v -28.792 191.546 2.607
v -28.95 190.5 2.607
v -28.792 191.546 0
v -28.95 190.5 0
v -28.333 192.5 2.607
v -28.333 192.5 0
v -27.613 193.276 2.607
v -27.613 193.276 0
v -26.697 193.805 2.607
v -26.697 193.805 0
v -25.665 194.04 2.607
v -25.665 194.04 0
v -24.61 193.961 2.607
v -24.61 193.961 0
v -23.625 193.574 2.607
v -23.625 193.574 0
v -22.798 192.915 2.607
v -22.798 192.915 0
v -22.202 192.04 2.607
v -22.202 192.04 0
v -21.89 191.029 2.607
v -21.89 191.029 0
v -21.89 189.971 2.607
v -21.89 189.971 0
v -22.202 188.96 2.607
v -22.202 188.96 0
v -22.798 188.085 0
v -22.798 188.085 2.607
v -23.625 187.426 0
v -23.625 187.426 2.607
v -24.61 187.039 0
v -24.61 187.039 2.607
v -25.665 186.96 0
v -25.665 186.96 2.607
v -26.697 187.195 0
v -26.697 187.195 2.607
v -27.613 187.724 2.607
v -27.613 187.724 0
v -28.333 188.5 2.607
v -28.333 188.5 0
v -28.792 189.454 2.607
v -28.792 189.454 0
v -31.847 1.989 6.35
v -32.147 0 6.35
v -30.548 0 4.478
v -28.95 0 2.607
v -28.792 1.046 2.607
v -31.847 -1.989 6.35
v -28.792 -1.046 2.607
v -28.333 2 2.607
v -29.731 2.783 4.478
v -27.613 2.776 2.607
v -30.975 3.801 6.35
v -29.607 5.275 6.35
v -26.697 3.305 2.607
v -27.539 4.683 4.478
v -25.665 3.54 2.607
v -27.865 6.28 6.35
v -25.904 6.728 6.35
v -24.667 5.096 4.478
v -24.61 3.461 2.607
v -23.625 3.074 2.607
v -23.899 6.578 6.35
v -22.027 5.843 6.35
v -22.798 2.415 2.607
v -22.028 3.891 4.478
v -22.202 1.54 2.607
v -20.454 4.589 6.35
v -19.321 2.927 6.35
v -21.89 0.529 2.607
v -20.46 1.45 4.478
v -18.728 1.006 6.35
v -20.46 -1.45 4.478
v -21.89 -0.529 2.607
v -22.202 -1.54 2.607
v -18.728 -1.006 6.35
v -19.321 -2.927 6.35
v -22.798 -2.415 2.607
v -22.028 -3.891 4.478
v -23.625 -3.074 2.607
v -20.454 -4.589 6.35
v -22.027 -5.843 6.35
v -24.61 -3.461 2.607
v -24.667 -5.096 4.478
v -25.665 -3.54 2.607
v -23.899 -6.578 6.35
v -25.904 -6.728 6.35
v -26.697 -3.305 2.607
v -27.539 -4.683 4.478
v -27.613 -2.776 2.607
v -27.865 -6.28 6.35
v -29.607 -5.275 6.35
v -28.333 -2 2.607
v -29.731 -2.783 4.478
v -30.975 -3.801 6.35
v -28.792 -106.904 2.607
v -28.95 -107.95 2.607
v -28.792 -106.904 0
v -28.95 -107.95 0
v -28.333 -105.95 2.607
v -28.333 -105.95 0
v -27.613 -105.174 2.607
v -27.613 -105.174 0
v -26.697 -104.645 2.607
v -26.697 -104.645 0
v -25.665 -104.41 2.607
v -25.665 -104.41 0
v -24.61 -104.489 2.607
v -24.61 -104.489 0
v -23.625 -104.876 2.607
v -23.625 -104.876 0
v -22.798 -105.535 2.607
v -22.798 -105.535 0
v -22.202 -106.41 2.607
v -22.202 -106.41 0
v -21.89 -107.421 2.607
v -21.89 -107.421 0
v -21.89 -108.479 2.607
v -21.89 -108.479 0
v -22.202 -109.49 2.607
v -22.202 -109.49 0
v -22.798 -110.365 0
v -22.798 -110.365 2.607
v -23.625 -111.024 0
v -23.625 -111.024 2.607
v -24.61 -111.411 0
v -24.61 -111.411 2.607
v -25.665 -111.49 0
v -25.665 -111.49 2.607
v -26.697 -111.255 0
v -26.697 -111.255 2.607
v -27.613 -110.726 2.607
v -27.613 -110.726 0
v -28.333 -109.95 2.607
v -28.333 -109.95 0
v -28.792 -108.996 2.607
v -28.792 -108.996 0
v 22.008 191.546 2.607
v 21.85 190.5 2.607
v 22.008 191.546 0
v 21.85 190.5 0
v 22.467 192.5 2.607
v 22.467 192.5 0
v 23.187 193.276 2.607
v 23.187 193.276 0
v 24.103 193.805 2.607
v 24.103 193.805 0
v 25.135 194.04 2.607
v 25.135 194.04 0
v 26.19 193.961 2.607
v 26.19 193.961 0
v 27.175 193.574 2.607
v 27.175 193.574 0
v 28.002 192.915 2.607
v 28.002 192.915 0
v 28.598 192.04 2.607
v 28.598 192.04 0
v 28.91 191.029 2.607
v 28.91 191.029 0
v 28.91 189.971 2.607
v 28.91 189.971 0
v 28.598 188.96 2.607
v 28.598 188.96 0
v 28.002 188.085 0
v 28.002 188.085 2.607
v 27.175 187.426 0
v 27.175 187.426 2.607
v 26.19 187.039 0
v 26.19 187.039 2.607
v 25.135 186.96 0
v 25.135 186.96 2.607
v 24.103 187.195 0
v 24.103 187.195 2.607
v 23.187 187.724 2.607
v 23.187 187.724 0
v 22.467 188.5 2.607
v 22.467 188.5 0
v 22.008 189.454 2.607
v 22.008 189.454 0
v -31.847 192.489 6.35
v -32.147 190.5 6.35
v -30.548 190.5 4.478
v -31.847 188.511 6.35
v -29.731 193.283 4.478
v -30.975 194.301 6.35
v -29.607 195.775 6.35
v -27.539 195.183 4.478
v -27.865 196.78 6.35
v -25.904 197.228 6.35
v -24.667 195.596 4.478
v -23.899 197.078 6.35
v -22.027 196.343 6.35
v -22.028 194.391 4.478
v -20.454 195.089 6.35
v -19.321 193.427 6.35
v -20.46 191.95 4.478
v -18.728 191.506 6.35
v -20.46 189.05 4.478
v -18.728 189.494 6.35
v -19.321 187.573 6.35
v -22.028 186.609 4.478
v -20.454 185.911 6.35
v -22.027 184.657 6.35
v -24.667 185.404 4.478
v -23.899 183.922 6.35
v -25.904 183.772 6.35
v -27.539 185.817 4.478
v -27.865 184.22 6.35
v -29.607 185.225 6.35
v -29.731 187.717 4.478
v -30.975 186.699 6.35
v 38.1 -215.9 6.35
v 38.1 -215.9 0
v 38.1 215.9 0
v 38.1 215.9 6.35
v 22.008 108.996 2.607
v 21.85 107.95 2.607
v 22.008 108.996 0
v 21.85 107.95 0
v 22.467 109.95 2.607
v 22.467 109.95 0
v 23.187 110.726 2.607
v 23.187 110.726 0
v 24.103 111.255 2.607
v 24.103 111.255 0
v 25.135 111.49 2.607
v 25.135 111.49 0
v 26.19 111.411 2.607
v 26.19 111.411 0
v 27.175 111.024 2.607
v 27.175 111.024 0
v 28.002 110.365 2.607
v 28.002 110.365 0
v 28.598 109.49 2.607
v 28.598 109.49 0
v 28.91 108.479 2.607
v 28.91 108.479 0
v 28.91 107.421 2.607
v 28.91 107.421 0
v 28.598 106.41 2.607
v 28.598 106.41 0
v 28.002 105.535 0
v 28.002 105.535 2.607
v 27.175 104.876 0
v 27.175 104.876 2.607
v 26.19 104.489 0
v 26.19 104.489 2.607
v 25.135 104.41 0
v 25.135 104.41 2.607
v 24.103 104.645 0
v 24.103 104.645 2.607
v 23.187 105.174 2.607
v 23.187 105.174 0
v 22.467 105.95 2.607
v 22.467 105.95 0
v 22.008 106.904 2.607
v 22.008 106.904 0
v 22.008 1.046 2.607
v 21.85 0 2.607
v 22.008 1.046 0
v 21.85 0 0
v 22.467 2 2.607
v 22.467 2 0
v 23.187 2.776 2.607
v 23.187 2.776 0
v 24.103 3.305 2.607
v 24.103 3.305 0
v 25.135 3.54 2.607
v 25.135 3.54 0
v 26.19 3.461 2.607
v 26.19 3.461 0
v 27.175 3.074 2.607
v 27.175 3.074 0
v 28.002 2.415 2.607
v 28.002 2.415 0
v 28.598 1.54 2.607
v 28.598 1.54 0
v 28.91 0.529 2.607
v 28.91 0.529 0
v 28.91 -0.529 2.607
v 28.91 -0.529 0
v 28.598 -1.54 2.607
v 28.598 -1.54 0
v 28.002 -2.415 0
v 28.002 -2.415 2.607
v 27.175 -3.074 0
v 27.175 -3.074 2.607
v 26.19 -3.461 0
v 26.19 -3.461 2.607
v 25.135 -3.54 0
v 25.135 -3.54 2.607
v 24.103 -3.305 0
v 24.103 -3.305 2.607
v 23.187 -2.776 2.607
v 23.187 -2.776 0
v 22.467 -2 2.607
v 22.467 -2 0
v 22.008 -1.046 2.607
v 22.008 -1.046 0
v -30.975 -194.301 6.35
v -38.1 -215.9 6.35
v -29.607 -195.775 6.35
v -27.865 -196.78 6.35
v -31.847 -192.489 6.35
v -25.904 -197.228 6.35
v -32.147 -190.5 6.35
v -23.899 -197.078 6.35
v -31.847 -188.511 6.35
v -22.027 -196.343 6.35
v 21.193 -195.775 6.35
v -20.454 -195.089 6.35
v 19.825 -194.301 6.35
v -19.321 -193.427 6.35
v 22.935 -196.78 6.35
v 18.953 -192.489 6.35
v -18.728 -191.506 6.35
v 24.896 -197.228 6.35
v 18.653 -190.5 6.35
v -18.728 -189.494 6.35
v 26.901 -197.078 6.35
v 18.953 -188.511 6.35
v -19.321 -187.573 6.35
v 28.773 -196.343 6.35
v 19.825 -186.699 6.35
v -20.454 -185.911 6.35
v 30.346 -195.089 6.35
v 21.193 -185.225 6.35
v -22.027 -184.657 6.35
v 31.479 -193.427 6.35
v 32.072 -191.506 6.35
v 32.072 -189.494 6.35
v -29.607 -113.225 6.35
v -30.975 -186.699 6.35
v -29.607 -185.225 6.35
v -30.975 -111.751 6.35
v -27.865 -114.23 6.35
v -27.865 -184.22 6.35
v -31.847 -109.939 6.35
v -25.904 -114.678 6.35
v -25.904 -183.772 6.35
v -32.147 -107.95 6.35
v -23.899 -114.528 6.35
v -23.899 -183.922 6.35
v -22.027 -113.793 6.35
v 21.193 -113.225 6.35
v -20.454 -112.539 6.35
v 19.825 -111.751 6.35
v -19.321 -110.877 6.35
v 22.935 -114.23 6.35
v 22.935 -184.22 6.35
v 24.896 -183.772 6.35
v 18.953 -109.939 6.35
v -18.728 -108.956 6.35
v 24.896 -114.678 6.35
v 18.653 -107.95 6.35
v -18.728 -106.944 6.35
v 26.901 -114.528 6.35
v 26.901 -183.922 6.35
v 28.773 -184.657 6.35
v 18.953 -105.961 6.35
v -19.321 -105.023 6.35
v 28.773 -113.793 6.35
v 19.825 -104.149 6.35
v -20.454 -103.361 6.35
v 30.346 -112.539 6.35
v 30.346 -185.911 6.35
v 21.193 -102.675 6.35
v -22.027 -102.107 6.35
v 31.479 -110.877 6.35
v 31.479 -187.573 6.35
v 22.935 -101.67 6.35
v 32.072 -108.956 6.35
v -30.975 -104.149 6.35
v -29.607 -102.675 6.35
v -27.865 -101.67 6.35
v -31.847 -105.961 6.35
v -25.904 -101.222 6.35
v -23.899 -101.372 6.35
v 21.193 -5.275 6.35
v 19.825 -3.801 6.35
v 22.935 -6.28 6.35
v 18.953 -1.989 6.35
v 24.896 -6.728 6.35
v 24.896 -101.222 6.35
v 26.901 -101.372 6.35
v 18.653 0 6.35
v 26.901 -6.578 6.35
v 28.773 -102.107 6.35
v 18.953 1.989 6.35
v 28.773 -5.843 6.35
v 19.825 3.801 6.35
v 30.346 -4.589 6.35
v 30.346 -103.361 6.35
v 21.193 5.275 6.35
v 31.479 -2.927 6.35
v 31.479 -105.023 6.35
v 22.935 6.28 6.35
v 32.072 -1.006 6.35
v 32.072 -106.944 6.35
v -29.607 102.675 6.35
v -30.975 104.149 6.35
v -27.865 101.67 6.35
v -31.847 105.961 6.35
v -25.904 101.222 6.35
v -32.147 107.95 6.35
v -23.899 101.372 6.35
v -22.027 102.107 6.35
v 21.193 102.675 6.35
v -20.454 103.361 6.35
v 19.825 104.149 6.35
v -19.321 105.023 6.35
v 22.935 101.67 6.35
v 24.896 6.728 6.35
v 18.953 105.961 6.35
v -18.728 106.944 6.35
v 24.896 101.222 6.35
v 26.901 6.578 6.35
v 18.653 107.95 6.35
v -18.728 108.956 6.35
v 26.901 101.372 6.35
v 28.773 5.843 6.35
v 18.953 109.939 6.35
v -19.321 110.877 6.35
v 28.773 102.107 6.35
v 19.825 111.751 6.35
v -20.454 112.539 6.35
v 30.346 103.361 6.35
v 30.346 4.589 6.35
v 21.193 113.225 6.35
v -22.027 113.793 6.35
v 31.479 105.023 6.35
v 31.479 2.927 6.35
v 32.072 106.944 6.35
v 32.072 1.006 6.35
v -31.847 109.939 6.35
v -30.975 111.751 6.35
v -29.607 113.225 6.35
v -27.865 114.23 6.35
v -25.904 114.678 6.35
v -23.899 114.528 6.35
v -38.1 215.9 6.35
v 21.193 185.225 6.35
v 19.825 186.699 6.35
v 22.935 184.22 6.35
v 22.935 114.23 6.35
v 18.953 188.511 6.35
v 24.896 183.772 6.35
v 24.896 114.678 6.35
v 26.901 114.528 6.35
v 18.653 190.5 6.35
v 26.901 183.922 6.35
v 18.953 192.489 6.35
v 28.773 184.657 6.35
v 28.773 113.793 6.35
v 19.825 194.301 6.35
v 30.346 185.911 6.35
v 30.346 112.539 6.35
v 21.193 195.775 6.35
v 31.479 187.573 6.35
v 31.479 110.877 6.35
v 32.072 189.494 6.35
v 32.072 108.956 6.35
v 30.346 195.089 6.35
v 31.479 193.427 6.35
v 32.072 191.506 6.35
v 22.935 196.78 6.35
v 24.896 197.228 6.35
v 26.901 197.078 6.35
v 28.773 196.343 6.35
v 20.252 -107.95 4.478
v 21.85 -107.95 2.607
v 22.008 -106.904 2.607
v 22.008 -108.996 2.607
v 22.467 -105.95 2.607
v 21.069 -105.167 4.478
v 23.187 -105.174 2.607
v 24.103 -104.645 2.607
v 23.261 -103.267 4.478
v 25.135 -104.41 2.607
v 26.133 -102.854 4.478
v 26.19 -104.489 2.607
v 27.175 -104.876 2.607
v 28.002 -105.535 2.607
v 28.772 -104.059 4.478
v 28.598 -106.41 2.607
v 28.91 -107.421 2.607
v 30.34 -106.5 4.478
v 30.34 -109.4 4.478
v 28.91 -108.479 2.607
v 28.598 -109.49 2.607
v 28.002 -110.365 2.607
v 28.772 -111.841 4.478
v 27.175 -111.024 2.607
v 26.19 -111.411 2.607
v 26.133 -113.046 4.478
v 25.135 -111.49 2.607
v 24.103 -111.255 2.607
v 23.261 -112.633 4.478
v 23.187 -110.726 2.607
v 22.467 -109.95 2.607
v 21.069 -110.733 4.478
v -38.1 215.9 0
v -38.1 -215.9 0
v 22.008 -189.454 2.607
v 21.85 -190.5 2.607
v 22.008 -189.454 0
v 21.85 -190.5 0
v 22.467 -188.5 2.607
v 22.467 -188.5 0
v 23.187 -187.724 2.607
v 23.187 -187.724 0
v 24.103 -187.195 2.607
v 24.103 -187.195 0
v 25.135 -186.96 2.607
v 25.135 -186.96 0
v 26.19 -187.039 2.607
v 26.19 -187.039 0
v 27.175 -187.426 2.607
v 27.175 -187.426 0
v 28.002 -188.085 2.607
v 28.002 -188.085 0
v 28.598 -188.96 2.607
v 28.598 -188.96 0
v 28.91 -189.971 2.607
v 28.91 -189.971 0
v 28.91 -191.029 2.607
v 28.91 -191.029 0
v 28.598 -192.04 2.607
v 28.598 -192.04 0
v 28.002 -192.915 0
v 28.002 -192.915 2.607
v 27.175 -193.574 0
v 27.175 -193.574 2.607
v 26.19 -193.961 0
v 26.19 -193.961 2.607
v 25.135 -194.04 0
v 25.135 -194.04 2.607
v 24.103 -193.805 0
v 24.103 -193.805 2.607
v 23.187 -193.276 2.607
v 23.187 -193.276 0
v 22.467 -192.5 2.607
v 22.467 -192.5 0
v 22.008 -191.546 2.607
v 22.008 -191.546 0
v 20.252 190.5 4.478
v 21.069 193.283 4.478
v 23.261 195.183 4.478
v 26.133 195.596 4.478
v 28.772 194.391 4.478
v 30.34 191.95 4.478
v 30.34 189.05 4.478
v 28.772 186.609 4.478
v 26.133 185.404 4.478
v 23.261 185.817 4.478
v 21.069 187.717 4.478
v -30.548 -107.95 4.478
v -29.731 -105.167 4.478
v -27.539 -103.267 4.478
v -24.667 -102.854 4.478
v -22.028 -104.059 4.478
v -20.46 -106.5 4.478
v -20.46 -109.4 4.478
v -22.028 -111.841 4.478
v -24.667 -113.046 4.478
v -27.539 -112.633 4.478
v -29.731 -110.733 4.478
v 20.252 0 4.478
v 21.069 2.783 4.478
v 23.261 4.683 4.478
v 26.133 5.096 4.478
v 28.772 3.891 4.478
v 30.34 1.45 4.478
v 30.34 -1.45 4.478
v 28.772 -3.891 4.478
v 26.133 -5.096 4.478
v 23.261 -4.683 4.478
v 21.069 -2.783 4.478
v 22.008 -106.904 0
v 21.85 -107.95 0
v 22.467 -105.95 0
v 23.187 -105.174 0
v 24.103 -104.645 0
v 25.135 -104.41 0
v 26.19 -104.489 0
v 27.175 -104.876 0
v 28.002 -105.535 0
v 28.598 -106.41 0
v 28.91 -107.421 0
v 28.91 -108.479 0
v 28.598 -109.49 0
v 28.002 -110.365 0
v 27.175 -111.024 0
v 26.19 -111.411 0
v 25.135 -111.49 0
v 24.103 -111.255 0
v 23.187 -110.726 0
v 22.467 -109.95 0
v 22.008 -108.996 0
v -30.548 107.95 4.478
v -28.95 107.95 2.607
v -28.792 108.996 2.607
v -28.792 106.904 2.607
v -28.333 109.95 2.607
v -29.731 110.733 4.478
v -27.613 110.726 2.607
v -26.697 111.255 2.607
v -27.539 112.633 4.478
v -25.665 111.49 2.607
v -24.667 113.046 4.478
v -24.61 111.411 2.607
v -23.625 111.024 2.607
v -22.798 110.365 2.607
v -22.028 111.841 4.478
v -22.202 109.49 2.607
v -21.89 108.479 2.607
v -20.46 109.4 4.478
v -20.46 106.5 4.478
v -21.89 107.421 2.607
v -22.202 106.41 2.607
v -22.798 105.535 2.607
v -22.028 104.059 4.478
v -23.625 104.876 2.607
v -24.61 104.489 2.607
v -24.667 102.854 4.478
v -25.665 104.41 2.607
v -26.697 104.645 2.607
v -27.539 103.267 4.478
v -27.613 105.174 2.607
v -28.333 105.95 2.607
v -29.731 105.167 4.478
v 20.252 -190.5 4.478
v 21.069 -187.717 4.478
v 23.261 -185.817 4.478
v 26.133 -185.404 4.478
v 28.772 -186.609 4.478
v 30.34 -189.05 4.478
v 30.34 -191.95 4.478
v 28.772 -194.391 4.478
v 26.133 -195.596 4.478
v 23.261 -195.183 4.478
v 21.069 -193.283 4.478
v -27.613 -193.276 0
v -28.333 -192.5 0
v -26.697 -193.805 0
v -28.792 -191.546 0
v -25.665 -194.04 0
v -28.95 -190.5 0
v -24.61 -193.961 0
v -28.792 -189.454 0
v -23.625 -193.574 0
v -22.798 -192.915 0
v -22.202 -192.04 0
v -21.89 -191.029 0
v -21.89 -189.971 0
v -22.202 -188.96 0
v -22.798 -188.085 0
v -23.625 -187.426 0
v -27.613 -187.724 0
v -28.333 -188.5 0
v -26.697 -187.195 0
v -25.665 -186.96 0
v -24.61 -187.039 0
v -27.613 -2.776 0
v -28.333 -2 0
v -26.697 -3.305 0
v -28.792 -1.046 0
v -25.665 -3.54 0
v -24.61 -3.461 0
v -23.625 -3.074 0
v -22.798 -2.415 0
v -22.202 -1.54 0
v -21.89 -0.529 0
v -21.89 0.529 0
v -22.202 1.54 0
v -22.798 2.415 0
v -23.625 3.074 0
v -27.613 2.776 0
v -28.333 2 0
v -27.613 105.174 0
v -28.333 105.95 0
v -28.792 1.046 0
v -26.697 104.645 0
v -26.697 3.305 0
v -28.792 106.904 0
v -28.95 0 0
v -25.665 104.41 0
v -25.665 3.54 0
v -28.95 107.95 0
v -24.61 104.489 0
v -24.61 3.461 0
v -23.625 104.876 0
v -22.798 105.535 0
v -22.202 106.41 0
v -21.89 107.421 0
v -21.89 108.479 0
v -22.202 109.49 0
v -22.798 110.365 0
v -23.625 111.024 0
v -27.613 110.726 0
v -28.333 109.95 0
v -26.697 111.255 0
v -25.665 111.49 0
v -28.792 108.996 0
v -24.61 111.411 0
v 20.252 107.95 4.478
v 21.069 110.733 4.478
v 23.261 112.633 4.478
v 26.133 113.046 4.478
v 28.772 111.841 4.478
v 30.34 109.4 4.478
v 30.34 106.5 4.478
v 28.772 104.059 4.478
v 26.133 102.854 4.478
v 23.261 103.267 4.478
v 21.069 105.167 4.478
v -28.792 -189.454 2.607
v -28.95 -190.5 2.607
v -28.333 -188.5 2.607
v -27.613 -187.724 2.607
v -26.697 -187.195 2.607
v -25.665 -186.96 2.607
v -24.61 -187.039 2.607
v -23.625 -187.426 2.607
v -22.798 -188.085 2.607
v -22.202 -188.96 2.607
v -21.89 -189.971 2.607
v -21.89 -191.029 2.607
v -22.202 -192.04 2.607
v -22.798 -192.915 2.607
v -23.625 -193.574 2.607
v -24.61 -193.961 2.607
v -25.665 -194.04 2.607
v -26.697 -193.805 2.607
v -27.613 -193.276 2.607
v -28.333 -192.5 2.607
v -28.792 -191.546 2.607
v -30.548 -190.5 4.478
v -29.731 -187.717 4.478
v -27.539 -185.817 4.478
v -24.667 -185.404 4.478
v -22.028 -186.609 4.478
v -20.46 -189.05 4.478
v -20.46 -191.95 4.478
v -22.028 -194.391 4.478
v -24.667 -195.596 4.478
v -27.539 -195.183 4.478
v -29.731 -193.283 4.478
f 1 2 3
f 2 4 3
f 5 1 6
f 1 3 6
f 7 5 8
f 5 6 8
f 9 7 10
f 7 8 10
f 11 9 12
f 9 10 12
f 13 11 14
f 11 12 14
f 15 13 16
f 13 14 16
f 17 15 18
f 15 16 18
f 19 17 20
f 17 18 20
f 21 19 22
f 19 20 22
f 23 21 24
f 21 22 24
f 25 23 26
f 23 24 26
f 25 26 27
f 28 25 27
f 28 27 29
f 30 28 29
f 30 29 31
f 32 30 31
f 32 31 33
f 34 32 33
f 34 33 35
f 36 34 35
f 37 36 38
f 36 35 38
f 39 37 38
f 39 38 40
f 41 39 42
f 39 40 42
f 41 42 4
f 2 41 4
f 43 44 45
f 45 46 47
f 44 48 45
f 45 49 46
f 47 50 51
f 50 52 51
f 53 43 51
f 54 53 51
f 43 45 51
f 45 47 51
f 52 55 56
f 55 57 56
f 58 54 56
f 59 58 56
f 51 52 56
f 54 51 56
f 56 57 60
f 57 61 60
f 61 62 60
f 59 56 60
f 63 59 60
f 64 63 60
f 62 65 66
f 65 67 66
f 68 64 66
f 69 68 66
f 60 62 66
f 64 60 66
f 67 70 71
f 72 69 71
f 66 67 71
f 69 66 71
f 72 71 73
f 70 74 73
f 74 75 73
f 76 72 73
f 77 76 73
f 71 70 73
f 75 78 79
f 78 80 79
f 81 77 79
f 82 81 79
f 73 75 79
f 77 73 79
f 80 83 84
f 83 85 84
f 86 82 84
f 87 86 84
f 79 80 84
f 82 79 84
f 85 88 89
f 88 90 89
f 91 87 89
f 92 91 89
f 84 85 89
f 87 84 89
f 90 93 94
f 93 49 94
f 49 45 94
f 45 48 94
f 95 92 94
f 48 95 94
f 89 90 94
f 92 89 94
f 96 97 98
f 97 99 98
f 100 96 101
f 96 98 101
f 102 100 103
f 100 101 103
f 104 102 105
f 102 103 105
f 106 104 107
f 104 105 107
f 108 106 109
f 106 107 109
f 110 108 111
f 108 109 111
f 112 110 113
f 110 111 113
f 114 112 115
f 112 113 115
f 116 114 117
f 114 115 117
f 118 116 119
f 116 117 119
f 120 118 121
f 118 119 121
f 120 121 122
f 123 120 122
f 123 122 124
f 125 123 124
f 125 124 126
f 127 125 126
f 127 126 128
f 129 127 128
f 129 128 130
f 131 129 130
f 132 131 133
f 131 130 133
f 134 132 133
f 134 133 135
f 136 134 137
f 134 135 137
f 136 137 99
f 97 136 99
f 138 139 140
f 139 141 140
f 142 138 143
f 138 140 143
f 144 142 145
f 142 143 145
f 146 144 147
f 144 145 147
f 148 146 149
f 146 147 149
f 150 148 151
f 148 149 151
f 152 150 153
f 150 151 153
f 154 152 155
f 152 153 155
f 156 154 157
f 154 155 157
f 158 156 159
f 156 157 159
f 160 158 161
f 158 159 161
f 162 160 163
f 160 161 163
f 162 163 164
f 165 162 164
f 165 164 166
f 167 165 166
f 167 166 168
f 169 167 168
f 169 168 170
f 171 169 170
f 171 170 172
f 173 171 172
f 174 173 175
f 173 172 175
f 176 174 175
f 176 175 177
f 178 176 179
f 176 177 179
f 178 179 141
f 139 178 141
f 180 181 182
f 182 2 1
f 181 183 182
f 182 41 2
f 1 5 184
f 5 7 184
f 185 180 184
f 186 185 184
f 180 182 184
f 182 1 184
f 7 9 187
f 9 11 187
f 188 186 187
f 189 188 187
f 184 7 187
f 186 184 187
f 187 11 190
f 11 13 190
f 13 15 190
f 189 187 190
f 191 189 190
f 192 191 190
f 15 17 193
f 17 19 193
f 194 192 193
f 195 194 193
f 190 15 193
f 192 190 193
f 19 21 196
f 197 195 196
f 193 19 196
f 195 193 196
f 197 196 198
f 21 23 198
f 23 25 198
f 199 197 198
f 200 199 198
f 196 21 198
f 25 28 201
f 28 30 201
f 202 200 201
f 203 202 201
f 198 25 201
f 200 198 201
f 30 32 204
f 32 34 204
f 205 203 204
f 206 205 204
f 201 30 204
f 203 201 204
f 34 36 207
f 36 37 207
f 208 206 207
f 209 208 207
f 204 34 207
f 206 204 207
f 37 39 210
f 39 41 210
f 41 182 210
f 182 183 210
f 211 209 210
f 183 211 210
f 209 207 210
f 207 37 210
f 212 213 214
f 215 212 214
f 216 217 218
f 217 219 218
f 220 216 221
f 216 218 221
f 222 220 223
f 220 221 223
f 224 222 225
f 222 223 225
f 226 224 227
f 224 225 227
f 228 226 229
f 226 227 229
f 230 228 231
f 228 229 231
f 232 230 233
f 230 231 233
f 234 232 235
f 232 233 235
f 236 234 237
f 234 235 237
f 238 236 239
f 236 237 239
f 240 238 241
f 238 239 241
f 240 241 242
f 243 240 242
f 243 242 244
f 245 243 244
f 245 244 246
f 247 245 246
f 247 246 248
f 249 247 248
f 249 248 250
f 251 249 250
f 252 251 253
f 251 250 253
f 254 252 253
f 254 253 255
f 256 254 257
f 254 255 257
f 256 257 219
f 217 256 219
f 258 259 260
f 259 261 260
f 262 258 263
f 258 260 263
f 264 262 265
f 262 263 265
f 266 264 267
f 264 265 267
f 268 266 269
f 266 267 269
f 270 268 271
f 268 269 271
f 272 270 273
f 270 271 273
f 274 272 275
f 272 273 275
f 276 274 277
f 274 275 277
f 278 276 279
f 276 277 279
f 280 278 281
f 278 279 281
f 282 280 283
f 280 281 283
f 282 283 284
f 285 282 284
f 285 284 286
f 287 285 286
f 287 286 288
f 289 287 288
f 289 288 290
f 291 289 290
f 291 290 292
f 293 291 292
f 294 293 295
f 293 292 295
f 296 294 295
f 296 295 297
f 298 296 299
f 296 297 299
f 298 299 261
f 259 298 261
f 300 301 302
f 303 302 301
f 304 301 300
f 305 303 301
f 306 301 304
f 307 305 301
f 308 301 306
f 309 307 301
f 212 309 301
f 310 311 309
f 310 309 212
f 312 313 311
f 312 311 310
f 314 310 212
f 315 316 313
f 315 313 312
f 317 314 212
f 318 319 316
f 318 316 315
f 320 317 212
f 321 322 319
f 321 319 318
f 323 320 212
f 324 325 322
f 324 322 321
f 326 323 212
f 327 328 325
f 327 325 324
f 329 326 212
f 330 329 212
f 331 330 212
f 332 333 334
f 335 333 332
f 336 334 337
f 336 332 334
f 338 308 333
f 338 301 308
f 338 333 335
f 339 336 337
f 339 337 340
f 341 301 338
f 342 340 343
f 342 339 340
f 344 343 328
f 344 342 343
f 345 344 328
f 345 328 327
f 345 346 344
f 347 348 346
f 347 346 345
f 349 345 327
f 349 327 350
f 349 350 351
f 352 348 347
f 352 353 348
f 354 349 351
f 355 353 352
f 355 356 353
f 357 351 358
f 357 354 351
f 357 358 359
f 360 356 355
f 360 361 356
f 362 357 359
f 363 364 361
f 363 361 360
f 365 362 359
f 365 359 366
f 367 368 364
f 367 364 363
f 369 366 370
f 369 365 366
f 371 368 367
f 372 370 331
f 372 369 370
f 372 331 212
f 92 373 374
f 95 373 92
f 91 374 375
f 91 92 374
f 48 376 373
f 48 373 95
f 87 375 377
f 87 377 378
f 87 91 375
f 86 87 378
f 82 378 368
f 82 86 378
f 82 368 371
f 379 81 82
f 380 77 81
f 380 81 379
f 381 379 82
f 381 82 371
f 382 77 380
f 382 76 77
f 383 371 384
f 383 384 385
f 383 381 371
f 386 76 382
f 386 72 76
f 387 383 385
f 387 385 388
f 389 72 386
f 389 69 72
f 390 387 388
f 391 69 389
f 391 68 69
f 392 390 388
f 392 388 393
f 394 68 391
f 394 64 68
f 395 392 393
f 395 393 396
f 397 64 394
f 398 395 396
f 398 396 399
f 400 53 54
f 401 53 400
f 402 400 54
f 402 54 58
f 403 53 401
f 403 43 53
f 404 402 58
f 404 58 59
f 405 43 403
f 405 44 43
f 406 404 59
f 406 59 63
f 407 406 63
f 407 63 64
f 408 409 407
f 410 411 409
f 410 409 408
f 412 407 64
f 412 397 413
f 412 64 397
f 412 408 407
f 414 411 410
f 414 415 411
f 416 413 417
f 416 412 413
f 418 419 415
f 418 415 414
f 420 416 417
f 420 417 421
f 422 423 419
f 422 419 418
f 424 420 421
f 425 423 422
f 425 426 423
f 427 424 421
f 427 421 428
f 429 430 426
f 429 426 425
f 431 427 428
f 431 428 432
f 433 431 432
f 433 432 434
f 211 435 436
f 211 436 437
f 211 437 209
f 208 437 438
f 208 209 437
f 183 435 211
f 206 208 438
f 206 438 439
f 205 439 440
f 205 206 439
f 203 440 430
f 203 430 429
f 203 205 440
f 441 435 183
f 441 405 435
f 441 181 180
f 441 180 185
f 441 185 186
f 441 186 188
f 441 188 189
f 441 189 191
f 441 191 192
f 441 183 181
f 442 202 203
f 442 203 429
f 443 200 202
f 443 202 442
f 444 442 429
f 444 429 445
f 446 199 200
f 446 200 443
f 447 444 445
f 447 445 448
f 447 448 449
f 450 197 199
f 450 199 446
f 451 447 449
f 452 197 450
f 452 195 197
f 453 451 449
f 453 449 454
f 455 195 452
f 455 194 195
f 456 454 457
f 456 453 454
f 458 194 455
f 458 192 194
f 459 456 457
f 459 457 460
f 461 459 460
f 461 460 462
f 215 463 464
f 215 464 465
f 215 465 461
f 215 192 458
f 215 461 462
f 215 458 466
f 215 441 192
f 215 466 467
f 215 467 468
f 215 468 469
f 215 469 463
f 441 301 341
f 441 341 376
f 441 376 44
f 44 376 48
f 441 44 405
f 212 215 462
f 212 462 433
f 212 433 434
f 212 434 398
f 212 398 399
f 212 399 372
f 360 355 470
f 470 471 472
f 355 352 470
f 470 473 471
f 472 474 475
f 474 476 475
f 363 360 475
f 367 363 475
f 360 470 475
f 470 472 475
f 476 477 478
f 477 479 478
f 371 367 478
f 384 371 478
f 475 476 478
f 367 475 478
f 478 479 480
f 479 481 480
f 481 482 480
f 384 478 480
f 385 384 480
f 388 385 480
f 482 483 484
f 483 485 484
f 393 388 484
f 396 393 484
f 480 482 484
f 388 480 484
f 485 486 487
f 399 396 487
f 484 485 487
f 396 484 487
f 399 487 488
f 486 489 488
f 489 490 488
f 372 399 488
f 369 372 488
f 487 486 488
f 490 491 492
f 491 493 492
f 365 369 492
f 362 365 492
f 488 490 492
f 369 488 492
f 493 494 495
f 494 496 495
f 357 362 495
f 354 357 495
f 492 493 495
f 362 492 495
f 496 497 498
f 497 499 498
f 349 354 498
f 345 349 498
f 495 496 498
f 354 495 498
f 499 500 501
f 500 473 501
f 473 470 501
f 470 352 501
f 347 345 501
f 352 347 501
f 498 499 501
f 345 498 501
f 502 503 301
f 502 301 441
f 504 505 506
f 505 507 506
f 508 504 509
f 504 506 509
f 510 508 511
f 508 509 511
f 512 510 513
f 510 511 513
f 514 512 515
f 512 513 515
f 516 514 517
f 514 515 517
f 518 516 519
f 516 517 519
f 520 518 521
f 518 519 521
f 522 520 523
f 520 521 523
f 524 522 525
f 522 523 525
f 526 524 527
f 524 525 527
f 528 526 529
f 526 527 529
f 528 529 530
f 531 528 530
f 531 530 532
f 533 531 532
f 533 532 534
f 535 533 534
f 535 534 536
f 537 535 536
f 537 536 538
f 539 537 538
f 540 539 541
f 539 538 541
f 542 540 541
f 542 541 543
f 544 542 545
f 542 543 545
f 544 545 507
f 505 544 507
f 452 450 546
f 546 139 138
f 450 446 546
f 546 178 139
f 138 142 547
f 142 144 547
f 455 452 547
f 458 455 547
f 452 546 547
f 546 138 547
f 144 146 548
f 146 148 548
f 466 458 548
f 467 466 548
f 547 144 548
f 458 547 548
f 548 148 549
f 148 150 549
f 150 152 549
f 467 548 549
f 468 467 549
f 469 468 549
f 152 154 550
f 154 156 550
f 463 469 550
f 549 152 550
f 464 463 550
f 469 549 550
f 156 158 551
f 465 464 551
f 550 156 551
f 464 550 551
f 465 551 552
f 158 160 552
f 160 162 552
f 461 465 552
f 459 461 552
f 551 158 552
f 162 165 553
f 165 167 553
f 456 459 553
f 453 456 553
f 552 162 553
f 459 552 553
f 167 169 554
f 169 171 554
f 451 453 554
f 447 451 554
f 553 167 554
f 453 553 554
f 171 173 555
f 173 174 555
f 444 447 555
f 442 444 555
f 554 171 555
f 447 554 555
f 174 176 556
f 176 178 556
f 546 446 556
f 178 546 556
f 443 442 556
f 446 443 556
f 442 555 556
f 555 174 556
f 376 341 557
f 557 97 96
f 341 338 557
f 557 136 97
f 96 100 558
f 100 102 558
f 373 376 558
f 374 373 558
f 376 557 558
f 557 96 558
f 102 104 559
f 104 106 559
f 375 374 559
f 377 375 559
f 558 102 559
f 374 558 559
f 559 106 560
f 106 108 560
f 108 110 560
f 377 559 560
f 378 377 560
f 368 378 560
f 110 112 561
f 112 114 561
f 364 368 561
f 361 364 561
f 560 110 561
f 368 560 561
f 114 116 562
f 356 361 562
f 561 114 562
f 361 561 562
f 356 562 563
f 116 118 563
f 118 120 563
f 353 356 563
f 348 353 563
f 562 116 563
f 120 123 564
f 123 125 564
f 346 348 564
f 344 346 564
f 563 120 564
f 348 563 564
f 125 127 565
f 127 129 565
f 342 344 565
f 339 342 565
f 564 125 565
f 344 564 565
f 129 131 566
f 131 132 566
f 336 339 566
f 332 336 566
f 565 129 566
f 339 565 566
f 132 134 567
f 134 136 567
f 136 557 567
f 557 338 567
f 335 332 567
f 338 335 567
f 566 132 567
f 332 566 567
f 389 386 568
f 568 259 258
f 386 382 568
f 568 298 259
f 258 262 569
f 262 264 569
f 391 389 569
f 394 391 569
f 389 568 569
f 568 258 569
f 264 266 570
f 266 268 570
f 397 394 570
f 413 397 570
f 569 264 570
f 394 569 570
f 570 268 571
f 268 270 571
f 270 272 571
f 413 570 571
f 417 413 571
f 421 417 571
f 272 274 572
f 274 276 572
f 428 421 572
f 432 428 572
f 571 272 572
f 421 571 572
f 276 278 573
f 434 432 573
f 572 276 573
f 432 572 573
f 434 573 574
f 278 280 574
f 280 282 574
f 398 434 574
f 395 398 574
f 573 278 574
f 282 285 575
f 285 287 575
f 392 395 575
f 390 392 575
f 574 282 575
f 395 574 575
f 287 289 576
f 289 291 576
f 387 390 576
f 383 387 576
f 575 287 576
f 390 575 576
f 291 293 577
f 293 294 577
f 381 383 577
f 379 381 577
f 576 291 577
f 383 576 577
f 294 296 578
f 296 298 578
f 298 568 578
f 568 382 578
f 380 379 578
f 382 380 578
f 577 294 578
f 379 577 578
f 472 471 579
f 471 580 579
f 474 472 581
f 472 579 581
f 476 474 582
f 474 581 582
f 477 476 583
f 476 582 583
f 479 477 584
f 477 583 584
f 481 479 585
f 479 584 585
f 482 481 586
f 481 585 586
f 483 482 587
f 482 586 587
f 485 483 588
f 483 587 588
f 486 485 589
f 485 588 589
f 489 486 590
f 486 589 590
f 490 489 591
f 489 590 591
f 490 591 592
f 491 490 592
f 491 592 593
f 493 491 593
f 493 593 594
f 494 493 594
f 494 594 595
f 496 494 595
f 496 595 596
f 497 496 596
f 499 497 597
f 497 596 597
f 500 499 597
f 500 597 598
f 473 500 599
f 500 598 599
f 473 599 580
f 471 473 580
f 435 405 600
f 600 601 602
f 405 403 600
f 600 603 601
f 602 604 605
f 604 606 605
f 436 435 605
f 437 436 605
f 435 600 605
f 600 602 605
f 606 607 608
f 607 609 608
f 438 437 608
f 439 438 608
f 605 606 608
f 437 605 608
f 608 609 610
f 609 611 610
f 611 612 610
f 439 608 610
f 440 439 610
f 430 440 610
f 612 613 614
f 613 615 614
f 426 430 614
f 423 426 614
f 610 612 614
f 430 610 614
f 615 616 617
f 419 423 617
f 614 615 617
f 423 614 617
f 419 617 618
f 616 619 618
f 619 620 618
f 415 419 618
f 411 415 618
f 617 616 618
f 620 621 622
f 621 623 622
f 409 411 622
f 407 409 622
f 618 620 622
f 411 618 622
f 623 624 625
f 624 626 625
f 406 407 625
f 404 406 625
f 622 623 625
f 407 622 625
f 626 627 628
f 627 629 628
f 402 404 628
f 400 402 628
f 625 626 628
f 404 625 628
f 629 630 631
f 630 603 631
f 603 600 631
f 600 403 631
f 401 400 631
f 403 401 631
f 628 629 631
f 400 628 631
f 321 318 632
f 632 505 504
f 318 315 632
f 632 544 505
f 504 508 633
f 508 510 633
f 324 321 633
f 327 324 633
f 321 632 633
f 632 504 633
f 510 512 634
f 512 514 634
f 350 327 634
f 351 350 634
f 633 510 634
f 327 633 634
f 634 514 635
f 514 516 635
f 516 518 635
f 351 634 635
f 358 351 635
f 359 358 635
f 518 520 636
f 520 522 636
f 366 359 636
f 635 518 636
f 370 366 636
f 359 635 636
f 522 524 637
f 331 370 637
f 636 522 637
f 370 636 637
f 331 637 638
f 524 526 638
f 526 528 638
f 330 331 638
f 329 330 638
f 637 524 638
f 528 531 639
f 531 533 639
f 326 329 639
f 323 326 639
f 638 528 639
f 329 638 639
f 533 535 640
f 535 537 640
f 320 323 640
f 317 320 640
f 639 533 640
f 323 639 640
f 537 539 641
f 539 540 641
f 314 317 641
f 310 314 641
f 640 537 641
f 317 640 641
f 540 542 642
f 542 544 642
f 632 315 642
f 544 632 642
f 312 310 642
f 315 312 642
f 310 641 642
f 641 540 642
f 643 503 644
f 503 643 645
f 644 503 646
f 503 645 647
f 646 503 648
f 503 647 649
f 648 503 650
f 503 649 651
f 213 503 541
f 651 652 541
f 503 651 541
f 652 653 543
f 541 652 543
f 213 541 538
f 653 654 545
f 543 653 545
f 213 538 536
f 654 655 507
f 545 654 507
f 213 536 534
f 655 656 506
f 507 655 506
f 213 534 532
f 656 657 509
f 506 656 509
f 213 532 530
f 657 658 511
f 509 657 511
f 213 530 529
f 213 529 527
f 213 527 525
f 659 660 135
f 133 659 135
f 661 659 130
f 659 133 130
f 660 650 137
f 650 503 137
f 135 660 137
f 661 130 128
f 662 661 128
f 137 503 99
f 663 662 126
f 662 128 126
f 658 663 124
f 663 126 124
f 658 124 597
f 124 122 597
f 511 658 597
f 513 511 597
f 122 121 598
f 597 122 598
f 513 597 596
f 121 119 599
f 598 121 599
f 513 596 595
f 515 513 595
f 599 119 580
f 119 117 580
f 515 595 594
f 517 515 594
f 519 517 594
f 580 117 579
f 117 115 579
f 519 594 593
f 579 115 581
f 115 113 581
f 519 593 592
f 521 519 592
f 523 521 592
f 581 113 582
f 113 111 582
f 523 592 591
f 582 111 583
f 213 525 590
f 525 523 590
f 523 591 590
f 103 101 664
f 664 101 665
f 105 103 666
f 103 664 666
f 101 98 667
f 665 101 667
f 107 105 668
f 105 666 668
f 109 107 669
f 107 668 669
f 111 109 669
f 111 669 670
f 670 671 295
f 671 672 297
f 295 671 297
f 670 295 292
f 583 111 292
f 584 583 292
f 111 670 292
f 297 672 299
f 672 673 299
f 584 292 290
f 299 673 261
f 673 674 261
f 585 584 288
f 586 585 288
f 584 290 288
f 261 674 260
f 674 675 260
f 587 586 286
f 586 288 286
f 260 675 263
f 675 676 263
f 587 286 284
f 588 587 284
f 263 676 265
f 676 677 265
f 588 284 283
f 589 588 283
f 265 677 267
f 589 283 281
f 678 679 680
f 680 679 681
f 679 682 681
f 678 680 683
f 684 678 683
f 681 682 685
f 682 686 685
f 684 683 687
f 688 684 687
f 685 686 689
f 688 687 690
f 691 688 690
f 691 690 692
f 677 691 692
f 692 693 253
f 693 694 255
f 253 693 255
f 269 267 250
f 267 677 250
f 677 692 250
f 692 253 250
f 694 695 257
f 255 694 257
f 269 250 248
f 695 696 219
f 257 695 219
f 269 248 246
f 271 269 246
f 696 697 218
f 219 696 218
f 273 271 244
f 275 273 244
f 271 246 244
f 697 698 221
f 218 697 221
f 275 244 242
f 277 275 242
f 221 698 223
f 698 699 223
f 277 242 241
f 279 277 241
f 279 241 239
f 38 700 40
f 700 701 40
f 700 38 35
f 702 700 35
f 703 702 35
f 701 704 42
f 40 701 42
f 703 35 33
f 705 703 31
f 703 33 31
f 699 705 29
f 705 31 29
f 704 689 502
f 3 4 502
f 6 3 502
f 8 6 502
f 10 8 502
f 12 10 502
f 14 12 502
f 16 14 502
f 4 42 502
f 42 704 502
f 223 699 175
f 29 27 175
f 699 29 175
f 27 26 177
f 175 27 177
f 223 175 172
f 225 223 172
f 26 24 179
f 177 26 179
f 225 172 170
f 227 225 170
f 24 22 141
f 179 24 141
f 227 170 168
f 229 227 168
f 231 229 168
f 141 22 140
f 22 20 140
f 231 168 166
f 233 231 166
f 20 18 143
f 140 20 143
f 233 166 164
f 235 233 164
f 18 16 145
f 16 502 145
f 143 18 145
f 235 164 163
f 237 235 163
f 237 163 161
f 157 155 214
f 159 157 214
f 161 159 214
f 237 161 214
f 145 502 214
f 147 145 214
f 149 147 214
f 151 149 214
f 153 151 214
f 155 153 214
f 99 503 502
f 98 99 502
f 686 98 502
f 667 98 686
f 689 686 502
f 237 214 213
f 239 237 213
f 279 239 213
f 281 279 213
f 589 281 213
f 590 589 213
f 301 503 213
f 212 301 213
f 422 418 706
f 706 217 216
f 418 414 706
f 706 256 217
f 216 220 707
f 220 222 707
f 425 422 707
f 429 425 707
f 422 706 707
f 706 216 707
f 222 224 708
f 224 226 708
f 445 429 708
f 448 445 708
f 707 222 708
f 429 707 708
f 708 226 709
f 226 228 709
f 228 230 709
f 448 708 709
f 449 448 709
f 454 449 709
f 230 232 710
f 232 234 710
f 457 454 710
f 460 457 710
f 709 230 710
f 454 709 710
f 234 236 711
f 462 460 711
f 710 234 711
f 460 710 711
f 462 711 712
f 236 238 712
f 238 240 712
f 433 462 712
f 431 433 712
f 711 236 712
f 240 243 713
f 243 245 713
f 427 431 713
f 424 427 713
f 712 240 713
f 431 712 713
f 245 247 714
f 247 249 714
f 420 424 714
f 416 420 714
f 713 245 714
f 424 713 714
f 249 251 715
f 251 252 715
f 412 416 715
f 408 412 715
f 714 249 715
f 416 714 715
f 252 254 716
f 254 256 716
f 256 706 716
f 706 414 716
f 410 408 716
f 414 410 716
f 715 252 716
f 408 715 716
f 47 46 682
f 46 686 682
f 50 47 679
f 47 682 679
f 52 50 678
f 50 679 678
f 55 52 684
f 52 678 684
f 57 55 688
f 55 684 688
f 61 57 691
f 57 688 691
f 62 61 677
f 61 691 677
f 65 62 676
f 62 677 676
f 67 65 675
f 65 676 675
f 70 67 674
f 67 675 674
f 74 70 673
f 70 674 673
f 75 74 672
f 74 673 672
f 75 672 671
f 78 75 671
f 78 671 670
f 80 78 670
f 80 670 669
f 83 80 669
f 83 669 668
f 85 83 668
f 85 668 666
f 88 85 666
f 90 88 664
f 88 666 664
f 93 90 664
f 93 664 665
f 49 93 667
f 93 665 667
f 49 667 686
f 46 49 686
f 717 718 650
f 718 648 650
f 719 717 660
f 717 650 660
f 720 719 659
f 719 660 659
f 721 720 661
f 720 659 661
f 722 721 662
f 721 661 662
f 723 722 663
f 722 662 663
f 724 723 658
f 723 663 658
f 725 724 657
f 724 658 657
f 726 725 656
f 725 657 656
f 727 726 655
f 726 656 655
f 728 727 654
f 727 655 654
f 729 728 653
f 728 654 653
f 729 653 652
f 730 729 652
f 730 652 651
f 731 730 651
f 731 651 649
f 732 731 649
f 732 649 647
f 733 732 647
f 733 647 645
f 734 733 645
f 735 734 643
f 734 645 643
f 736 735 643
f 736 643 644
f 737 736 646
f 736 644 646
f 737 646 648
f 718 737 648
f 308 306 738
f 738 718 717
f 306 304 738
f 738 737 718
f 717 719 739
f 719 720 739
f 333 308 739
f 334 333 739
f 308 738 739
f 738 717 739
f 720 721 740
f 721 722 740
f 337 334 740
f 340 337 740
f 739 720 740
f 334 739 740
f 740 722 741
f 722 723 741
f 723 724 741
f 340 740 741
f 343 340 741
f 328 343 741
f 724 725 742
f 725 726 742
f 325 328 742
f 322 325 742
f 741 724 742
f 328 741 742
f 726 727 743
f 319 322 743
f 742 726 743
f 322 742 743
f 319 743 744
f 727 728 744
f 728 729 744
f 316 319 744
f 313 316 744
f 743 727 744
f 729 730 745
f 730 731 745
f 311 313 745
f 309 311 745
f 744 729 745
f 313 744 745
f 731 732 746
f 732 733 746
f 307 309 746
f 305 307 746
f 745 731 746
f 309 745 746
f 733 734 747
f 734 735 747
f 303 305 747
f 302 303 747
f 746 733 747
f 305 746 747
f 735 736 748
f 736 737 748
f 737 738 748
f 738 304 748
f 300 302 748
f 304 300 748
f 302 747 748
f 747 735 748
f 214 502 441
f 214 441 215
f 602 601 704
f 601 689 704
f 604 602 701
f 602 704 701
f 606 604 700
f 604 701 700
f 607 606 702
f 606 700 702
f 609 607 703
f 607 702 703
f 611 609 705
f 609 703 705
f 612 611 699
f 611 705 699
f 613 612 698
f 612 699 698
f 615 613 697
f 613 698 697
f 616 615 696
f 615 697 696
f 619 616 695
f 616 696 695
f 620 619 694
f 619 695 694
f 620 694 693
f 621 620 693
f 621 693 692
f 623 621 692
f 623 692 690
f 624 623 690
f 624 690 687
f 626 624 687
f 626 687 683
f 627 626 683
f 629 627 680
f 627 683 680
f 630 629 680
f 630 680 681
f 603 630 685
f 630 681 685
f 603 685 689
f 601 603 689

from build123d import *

# Parameters (mm, degrees)
SKETCH_W         = 76.2
SKETCH_H         = 431.8
PAD_DEPTH        = 6.35
HOLE_D           = 7.1
HOLE_CSINK_D     = 13.49375
HOLE_CSINK_ANGLE = 81


with BuildPart() as part:
    # Sketch → Pad (new body)
    with BuildSketch(Plane.XY):
        Rectangle(SKETCH_W, SKETCH_H)
    extrude(amount=PAD_DEPTH)

    # Hole (through all)
    with Locations(Plane.XY.offset(6.35)):
        with Locations((-25.4, 190.5), (-25.4, 0), (-25.4, 107.95), (-25.4, -190.5), (-25.4, -107.95), (25.4, -190.5), (25.4, -107.95), (25.4, 0), (25.4, 107.95), (25.4, 190.5)):
            CounterSinkHole(HOLE_D / 2, HOLE_CSINK_D / 2, counter_sink_angle=HOLE_CSINK_ANGLE)


solid = part.part
